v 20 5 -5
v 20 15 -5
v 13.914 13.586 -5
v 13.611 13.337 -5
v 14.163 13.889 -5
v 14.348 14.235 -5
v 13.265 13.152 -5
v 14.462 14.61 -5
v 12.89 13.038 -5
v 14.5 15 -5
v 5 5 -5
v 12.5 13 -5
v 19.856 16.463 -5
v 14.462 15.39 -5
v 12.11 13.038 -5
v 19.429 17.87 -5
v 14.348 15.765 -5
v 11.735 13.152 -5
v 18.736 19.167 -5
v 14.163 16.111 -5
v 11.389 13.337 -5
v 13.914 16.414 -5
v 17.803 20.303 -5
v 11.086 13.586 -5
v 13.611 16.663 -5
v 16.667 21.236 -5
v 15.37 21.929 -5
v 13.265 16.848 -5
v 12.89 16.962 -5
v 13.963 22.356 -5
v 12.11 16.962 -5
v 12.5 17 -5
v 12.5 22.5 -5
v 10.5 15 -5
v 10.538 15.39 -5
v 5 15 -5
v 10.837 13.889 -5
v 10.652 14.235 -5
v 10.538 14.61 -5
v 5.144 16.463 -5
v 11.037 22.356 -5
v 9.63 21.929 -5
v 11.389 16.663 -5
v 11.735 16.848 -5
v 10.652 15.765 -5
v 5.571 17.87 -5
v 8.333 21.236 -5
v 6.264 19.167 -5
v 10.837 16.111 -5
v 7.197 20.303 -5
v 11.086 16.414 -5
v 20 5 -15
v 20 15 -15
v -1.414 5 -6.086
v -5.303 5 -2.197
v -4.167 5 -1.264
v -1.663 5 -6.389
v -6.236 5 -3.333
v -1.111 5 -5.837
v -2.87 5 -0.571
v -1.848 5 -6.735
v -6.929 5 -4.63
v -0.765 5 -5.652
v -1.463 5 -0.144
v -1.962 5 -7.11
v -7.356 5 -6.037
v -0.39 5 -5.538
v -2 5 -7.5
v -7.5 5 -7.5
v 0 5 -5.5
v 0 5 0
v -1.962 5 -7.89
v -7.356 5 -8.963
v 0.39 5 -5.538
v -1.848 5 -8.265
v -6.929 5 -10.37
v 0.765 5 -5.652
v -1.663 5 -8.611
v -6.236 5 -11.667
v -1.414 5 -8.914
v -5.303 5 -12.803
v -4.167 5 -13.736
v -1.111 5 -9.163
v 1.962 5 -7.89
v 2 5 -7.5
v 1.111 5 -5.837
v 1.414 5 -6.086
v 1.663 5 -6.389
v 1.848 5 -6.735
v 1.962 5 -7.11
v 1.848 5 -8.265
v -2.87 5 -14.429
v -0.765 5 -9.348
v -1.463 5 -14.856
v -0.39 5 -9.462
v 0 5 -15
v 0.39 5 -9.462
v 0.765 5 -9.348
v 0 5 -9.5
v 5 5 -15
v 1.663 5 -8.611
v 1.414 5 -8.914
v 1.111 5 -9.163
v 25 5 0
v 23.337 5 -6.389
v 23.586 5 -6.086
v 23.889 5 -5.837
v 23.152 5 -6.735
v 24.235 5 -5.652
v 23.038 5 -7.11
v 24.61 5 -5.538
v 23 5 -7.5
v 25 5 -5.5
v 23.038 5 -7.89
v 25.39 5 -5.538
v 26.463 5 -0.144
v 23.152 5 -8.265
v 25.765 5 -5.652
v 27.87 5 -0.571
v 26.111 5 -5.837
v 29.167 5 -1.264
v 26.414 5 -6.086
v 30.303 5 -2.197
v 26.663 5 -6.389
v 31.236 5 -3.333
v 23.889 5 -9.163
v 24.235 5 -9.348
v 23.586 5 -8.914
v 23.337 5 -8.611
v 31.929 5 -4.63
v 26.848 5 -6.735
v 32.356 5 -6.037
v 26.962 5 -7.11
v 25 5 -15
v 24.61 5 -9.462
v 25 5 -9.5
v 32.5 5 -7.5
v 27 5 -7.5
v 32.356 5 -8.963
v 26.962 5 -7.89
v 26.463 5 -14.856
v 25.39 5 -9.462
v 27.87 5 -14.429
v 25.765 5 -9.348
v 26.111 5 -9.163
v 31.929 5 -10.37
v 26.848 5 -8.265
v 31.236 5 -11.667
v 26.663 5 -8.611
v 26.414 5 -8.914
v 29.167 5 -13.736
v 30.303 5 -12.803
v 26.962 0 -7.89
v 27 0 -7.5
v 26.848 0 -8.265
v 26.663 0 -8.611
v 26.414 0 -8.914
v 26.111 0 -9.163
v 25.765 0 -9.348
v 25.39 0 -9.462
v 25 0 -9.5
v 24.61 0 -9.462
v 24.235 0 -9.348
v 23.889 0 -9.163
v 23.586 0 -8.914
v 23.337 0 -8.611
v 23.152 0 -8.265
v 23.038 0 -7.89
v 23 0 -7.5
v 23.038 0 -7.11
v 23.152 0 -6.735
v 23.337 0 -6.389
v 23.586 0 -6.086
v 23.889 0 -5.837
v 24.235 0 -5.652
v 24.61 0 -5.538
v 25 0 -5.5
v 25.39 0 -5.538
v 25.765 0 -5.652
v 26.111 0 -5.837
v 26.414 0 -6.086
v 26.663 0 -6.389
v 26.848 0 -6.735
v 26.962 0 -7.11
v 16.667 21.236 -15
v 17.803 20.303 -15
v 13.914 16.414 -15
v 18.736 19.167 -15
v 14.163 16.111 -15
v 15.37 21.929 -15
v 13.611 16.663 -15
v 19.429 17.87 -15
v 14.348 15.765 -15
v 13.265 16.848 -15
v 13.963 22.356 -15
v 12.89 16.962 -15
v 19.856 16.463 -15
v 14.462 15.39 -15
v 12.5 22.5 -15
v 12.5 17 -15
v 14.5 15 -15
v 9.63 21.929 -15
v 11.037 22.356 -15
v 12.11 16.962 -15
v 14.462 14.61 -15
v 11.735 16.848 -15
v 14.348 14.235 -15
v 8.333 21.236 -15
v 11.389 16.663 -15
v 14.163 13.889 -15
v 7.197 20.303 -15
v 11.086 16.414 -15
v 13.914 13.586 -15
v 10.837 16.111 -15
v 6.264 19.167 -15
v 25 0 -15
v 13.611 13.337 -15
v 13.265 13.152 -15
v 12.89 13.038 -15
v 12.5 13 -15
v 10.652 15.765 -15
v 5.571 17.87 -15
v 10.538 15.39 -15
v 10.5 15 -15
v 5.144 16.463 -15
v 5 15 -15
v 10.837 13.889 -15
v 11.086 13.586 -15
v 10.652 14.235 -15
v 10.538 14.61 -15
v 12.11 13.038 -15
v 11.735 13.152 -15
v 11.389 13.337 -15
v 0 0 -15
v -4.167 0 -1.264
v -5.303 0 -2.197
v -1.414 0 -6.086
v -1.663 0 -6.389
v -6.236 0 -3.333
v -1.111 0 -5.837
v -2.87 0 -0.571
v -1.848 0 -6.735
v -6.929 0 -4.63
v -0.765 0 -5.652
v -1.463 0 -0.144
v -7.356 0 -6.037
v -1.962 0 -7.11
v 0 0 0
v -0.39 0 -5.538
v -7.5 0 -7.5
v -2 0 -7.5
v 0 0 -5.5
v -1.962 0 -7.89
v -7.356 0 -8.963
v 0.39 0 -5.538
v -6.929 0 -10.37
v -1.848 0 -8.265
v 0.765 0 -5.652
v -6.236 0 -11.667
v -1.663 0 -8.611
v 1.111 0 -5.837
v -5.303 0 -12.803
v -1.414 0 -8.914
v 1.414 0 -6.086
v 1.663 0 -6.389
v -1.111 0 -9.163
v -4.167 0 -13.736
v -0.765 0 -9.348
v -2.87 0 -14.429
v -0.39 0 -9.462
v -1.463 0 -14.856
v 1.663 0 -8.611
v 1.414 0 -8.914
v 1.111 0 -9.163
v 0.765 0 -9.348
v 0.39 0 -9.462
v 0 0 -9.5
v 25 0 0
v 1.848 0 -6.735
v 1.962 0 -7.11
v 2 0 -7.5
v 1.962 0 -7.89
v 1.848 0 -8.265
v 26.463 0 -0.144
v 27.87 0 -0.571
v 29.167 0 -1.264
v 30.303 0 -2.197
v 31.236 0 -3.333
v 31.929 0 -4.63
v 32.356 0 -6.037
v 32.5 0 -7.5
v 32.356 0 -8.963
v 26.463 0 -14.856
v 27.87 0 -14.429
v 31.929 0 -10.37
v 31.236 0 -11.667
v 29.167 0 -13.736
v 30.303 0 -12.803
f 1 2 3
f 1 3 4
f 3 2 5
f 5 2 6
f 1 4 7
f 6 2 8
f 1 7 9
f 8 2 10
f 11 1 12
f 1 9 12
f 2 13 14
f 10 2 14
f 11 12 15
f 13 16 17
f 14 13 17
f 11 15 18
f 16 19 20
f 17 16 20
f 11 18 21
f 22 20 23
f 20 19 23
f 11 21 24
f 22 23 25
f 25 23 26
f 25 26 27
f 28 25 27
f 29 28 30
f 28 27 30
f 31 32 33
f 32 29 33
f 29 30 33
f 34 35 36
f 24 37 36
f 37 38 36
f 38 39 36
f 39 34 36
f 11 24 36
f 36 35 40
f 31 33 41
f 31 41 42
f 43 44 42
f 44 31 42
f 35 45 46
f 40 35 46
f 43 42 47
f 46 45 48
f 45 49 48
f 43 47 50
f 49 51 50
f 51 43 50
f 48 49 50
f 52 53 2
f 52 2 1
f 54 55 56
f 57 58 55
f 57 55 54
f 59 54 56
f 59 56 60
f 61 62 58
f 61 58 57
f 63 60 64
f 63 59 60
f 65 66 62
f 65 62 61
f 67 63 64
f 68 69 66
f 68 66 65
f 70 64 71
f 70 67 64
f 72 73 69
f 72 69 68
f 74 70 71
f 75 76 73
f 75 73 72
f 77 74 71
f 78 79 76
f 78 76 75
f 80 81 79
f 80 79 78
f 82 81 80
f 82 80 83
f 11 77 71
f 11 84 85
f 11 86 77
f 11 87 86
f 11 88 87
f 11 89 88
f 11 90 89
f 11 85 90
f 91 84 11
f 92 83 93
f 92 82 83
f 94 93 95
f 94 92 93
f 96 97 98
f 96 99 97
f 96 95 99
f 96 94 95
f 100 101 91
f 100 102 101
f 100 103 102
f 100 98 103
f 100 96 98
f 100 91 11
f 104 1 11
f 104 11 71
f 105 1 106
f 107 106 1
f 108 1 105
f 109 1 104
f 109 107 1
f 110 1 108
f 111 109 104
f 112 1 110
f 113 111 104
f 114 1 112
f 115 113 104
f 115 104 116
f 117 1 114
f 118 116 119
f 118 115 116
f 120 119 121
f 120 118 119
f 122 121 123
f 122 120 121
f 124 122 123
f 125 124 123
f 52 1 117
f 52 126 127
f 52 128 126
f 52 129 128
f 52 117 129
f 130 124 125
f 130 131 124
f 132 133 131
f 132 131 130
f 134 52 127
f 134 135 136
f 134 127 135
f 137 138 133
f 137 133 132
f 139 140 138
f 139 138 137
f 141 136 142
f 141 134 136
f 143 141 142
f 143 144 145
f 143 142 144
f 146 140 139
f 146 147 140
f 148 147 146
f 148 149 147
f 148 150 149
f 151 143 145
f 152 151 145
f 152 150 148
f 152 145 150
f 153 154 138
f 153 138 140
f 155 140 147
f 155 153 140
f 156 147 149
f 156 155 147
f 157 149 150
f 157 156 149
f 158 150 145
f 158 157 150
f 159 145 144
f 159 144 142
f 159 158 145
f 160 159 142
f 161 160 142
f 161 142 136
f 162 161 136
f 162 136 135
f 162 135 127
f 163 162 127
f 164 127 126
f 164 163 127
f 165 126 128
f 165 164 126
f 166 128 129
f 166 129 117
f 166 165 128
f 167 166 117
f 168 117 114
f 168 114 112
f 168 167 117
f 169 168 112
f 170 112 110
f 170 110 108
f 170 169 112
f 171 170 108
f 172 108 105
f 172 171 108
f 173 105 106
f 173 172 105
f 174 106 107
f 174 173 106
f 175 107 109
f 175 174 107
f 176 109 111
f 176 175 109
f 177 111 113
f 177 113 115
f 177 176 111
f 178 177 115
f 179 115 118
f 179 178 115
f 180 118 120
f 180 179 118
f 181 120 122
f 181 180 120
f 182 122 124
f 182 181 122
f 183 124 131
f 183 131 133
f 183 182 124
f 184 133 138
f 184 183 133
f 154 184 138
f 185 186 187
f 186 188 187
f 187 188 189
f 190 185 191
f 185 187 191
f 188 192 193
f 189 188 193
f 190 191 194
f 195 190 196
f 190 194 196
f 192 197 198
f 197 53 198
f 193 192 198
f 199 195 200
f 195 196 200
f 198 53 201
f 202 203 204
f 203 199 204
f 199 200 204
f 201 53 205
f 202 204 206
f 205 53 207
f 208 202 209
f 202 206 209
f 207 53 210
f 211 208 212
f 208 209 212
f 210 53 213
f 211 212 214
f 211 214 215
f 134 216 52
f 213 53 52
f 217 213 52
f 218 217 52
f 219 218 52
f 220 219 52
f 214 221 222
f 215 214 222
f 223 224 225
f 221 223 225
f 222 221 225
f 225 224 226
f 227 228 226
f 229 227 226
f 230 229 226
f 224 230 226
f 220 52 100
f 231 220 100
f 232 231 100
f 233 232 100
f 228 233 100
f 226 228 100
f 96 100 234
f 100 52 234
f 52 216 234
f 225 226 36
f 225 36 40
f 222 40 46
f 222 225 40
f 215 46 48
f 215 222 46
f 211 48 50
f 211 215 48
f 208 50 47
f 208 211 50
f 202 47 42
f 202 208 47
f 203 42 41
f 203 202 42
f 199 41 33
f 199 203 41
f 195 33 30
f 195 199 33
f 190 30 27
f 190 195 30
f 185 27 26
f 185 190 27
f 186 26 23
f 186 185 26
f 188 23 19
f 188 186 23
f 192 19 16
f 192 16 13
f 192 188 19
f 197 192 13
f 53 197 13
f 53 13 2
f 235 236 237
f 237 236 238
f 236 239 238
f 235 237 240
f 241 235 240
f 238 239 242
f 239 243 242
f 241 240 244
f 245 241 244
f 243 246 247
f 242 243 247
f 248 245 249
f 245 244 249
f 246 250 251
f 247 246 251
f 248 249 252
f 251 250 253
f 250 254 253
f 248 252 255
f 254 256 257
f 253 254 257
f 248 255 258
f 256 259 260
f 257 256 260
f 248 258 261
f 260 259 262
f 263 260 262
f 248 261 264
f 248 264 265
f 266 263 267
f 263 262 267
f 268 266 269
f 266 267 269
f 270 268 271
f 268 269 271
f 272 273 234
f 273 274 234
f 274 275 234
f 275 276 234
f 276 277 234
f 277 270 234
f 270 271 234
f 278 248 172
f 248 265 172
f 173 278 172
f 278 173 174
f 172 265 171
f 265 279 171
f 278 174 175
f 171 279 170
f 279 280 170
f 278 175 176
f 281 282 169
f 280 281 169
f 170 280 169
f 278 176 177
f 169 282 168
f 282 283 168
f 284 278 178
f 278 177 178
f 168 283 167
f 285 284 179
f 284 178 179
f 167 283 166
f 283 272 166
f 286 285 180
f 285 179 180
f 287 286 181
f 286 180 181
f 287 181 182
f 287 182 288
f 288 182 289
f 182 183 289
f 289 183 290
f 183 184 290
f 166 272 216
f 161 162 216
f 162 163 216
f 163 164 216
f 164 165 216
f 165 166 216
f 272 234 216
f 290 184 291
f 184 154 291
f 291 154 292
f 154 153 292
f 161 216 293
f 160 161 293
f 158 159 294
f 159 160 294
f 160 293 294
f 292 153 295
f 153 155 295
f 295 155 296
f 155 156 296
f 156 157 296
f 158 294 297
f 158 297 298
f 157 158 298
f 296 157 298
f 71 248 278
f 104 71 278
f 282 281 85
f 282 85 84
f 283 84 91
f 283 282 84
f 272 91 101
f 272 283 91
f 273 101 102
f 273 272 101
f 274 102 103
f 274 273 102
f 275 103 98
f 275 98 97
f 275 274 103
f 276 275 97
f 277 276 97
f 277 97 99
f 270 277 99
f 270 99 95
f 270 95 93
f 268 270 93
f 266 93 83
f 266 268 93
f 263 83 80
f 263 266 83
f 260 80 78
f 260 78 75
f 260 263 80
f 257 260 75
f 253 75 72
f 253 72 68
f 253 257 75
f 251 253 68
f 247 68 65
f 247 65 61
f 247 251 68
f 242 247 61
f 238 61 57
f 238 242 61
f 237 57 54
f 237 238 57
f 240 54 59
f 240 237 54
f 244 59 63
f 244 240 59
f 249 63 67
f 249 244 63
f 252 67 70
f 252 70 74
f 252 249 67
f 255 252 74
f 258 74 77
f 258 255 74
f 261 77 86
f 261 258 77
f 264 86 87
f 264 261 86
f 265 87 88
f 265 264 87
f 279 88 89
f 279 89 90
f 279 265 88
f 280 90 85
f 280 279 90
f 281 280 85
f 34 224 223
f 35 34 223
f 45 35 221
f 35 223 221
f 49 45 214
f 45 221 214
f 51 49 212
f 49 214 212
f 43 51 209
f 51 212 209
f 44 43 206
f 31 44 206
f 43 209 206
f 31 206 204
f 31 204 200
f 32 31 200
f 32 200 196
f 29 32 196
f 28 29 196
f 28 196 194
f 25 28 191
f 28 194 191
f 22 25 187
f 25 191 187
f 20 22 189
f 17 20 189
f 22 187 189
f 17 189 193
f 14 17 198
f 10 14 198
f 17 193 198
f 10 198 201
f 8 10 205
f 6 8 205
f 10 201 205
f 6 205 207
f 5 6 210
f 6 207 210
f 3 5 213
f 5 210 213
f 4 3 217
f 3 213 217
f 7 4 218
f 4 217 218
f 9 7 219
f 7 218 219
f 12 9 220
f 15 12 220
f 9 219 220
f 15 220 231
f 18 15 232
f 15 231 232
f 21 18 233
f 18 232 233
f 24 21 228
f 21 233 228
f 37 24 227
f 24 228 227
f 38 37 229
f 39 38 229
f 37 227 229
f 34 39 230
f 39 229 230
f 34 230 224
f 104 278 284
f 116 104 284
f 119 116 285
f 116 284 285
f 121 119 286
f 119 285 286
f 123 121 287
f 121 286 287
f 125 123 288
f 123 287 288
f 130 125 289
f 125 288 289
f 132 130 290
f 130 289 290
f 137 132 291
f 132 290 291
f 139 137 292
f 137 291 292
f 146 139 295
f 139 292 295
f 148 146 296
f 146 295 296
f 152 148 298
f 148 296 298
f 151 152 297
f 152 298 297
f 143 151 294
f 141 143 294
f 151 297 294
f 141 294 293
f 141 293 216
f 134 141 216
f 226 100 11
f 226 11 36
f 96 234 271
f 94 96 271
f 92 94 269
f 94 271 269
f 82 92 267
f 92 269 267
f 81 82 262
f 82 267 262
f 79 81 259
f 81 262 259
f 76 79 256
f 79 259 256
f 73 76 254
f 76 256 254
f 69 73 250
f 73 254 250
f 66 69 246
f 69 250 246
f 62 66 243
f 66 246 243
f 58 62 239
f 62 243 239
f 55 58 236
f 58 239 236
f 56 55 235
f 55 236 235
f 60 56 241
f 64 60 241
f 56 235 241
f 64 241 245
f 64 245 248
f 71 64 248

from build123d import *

# Parameters (mm, degrees)
SKETCH1_R           = 2
BOSS_EXTRUDE1_DEPTH = 5
SKETCH3_R           = 2
BOSS_EXTRUDE2_DEPTH = 10


with BuildPart() as part:
    # Sketch1 → Boss-Extrude1 (new body)
    with BuildSketch(Plane(origin=(0, 0, 0), x_dir=(1, 0, 0), z_dir=(0, 1, 0))):
        with BuildLine():
            Line((0, 0), (25, 0))
            ThreePointArc((25, 0), (32.5, 7.5), (25, 15))
            Line((25, 15), (0, 15))
            ThreePointArc((0, 15), (-7.5, 7.5), (0, 0))
        make_face()
        with Locations((0, 7.5)):
            Circle(SKETCH1_R, mode=Mode.SUBTRACT)
        with Locations((25, 7.5)):
            Circle(SKETCH1_R, mode=Mode.SUBTRACT)
    extrude(amount=BOSS_EXTRUDE1_DEPTH)

    # Sketch3 → Boss-Extrude2 (add)
    with BuildSketch(Plane(origin=(0, 0, -15), x_dir=(-1, 0, 0), z_dir=(0, 0, -1))):
        with BuildLine():
            Line((-20, 5), (-5, 5))
            Line((-5, 5), (-5, 15))
            ThreePointArc((-5, 15), (-12.5, 22.5), (-20, 15))
            Line((-20, 15), (-20, 5))
        make_face()
        with Locations((-12.5, 15)):
            Circle(SKETCH3_R, mode=Mode.SUBTRACT)
    extrude(amount=-BOSS_EXTRUDE2_DEPTH)


solid = part.part
